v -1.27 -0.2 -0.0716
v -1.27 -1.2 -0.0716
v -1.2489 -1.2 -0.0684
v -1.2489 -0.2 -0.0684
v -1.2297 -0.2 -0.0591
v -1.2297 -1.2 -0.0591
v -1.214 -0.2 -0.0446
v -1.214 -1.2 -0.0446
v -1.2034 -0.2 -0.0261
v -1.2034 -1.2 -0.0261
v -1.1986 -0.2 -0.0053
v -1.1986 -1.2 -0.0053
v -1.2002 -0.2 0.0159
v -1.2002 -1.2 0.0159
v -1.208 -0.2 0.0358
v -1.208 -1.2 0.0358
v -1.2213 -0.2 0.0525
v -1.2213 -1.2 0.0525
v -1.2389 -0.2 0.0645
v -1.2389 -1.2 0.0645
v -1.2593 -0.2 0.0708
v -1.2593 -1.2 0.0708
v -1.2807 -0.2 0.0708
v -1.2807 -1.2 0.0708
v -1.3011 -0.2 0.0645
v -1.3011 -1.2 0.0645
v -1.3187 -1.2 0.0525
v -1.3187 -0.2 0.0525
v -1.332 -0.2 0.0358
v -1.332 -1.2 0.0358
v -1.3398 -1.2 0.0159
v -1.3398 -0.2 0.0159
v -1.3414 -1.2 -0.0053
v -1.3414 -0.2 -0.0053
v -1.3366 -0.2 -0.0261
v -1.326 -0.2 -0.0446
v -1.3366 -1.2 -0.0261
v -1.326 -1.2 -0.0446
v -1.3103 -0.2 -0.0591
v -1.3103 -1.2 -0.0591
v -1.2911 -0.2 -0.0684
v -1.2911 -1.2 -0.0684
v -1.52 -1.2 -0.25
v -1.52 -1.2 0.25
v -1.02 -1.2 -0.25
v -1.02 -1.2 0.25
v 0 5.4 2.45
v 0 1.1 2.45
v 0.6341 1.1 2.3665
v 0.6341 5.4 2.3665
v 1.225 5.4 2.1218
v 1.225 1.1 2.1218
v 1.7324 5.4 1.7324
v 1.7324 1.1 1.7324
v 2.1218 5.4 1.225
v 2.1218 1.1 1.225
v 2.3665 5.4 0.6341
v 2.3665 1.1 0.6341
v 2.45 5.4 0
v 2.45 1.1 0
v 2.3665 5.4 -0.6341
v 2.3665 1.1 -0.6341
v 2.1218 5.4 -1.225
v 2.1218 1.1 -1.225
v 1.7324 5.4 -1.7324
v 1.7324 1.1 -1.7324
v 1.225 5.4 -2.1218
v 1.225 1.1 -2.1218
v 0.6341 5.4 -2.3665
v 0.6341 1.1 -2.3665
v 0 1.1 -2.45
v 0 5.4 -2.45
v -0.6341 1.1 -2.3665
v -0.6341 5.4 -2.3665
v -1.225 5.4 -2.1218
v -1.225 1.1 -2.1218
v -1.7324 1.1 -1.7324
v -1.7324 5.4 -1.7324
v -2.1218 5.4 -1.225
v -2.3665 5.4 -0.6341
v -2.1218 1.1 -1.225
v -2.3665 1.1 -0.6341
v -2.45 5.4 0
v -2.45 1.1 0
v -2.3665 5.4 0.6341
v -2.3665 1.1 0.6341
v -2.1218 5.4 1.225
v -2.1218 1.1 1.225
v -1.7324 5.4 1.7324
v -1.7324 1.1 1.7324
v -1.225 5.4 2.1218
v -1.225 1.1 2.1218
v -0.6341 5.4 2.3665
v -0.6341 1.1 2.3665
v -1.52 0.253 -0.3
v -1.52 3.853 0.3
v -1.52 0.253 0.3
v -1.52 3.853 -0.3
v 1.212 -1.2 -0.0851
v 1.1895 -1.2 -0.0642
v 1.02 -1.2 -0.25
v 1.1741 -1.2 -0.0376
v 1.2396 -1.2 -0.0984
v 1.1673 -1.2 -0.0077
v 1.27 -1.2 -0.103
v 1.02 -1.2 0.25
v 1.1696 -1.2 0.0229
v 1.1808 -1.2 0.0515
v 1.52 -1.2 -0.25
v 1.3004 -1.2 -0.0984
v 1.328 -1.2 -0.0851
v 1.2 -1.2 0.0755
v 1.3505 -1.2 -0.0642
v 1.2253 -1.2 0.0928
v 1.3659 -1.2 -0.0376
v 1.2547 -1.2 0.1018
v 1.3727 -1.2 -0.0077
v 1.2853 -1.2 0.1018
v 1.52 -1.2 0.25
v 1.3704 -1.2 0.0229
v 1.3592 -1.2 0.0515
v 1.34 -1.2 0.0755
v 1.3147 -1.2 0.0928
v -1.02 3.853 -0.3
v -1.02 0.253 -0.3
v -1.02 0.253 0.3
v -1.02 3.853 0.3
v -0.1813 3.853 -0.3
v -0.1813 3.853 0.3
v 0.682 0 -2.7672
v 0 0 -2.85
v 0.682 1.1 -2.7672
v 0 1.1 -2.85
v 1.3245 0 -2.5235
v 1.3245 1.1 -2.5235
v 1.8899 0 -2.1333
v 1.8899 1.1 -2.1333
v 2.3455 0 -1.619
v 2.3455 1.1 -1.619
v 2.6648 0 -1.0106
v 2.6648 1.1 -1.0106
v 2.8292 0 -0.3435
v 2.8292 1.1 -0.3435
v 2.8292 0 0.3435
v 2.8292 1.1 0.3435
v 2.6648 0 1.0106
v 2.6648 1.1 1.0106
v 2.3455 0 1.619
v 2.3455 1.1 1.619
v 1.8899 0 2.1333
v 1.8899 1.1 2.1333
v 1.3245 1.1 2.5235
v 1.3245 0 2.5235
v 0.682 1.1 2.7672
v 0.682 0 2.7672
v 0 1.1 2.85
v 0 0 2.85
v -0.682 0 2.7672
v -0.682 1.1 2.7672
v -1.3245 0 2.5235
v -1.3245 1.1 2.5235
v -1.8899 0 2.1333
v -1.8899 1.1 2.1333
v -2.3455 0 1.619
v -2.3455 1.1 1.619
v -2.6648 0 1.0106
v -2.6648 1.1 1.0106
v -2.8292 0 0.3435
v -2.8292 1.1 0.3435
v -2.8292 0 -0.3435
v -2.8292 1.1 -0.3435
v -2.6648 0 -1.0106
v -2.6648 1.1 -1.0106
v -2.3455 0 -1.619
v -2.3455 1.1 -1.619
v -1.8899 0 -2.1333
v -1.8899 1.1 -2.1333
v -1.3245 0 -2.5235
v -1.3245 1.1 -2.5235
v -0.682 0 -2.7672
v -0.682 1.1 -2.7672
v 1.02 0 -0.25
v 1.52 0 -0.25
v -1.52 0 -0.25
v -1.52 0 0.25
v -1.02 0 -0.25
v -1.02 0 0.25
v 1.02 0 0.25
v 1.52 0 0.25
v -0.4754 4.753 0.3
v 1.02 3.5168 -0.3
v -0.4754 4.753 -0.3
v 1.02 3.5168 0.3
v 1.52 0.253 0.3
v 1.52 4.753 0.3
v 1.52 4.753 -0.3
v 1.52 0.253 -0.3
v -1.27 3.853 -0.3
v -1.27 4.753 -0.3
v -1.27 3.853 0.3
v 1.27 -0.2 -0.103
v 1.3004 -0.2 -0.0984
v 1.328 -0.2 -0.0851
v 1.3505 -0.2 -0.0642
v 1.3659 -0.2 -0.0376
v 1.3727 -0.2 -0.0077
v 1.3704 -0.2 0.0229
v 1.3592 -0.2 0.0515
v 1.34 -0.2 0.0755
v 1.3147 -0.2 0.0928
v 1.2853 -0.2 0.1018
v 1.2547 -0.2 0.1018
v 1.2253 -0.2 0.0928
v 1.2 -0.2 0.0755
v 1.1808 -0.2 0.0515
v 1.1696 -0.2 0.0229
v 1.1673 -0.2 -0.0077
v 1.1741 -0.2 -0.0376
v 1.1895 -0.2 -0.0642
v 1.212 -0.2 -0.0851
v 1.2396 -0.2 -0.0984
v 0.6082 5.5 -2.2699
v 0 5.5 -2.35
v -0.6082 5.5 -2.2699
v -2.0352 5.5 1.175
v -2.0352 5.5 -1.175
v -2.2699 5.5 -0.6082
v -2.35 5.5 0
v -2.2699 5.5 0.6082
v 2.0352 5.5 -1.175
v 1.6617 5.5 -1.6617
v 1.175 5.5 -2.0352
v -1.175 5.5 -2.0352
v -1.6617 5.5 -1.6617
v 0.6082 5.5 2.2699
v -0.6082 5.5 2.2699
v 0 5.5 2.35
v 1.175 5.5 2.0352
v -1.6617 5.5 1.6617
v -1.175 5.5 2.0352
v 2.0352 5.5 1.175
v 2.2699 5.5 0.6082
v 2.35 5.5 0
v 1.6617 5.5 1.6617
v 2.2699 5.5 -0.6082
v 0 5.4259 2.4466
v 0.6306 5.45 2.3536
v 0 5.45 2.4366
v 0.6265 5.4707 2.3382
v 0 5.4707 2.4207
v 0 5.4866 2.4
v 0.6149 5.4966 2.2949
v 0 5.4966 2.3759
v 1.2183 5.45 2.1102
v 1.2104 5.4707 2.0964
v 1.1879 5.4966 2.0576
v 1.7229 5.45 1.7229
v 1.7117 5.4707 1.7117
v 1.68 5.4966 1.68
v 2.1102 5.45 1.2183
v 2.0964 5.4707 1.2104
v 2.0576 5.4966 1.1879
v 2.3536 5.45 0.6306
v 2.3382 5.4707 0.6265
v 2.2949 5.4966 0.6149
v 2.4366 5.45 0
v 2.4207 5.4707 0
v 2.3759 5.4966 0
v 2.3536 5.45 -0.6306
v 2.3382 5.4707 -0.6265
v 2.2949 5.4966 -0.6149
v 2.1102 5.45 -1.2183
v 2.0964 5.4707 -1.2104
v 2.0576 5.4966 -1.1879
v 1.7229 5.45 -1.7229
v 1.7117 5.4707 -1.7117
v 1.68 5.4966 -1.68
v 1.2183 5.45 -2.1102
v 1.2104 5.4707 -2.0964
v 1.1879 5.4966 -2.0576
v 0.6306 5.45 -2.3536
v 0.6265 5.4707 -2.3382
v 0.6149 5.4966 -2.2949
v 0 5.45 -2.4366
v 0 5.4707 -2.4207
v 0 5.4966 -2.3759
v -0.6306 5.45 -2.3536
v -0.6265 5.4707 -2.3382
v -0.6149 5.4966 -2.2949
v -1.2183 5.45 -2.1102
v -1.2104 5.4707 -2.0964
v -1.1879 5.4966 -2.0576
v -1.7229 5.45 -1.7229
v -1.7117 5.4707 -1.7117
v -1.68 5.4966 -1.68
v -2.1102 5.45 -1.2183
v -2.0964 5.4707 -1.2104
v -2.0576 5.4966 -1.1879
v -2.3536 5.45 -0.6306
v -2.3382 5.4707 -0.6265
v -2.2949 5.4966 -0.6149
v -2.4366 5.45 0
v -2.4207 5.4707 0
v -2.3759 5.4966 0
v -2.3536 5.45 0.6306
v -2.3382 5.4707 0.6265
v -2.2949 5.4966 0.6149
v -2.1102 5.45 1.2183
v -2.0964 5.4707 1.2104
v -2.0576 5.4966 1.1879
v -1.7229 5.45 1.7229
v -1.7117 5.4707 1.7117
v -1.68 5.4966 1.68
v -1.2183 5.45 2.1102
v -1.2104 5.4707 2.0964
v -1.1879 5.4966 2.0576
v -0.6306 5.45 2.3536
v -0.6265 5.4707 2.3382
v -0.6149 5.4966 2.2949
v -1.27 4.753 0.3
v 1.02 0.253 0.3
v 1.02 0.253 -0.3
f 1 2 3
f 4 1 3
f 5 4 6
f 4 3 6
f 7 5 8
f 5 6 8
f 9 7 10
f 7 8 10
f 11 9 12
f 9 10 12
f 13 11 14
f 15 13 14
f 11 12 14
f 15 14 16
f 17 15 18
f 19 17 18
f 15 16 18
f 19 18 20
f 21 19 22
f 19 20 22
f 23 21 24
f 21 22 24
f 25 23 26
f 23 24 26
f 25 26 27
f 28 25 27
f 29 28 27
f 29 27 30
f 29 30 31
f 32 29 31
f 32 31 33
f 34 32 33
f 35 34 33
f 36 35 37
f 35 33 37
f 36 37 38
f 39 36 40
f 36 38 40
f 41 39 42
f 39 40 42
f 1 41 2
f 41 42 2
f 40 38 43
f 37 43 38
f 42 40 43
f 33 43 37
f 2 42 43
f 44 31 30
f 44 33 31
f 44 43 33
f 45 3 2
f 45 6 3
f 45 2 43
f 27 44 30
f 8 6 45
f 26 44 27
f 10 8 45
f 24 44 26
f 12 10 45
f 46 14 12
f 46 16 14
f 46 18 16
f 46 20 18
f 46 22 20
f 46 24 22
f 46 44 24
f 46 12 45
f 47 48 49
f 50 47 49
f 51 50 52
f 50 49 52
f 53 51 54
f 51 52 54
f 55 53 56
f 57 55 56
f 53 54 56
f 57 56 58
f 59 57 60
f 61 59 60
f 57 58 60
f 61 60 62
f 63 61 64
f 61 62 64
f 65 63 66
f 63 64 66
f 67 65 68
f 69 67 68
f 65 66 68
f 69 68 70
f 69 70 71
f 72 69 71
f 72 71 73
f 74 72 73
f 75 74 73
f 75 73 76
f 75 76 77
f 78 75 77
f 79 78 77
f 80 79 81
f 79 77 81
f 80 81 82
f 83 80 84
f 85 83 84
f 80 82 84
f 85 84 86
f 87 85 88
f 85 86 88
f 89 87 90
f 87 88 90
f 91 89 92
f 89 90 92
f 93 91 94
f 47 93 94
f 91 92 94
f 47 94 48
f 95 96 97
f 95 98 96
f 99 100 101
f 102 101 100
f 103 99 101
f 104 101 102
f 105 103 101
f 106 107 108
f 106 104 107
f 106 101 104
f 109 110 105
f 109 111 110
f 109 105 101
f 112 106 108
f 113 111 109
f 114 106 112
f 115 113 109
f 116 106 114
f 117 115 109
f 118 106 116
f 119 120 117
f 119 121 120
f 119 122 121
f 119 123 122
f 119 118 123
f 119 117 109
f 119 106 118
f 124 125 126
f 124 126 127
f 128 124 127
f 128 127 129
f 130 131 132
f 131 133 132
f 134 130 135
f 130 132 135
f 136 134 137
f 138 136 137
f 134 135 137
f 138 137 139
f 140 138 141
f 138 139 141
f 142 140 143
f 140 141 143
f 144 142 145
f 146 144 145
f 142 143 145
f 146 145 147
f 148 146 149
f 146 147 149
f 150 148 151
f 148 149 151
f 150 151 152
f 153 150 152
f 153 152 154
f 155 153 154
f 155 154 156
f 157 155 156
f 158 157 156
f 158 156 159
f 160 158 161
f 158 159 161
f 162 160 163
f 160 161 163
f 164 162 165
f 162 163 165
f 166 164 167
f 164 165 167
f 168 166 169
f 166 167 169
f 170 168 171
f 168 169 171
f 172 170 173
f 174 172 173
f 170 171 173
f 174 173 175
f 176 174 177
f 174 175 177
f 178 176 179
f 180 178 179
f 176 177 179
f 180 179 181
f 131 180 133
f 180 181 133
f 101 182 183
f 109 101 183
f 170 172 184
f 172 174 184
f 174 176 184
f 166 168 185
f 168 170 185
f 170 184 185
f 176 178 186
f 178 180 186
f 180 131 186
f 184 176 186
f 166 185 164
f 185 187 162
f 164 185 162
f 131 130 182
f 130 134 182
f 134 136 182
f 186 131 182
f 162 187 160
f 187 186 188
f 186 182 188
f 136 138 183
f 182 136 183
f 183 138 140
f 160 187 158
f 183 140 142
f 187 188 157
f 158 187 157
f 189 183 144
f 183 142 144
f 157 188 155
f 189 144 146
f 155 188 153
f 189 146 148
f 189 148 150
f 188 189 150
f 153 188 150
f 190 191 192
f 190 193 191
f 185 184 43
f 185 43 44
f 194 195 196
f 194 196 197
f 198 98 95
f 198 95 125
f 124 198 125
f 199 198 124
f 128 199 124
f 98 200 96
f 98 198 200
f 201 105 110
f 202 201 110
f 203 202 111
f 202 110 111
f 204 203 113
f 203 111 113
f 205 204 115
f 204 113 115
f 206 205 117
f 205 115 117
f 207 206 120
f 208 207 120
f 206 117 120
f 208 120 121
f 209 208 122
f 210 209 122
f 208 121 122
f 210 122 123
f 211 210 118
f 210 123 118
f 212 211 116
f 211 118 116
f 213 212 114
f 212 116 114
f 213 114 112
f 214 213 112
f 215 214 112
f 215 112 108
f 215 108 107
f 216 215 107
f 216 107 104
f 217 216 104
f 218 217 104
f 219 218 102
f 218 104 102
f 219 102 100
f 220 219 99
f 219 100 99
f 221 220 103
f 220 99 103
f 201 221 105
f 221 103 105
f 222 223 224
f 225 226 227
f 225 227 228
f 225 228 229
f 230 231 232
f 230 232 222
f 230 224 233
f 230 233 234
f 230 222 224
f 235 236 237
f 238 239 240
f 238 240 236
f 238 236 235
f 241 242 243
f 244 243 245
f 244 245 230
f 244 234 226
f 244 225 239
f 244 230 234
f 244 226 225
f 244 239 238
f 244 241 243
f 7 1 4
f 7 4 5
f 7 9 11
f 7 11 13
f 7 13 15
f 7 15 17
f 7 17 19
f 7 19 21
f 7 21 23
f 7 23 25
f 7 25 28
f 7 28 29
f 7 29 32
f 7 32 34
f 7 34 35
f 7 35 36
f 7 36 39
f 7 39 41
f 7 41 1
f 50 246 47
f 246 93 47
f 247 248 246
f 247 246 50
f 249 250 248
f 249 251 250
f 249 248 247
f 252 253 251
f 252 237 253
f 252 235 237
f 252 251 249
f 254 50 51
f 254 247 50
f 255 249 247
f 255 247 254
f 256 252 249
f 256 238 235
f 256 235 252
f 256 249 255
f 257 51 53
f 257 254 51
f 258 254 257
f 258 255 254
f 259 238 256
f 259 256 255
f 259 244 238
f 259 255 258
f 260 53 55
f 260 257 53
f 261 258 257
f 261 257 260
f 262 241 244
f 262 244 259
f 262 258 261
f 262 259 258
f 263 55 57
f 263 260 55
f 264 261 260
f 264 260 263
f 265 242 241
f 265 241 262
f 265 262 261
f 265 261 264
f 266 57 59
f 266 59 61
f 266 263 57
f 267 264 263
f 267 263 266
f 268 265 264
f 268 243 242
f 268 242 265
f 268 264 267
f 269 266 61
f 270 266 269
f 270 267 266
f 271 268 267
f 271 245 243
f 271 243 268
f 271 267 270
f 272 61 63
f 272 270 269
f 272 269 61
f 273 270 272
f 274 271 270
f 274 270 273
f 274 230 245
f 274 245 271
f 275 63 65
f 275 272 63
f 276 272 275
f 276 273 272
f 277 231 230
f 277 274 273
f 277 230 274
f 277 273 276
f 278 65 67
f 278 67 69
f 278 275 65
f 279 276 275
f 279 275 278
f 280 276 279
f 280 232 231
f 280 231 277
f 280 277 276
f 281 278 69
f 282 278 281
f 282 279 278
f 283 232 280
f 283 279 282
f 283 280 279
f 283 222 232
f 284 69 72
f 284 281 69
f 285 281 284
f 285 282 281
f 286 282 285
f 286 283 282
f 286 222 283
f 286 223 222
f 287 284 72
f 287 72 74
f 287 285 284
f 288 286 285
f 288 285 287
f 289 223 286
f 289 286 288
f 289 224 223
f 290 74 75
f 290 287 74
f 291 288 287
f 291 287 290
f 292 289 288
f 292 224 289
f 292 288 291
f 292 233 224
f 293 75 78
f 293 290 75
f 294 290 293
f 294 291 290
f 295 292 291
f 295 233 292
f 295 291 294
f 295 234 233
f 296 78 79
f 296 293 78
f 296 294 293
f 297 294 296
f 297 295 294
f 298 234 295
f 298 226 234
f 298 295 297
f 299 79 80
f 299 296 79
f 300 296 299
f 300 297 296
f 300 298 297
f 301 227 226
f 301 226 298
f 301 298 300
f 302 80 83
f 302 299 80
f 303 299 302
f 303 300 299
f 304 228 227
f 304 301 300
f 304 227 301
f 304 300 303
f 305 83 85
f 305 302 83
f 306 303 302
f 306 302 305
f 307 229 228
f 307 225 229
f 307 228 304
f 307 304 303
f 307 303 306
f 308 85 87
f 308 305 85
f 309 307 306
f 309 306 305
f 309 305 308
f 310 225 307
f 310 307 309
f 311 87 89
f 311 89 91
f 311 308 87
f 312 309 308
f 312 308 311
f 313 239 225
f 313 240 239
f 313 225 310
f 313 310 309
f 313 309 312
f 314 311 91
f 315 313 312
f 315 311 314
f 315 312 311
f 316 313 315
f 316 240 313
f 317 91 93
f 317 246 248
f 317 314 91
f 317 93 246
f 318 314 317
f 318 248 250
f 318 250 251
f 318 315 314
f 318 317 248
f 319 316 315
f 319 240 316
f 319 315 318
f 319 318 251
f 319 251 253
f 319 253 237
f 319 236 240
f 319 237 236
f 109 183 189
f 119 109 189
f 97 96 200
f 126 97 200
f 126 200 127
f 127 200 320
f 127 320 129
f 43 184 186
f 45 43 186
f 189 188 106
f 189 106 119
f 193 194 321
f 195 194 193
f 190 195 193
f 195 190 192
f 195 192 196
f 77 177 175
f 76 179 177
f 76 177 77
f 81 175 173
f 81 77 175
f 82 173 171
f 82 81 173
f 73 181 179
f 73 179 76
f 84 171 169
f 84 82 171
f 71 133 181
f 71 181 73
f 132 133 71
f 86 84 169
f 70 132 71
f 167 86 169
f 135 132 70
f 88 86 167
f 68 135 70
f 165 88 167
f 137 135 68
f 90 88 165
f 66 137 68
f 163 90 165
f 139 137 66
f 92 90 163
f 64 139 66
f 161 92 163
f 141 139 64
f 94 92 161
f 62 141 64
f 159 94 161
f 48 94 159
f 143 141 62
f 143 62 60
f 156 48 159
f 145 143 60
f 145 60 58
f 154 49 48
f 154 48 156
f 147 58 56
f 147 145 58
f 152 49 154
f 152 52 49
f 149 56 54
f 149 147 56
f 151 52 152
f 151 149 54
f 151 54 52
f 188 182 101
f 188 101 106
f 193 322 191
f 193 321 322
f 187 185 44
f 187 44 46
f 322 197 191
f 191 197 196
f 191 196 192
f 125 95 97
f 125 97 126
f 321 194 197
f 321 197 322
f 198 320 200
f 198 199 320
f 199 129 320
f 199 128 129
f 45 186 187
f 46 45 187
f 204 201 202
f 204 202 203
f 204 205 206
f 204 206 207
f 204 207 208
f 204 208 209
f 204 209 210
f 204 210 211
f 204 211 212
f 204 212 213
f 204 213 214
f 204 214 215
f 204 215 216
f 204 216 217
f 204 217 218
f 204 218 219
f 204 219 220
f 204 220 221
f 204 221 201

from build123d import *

# Parameters (mm, degrees)
SKETCH_1_W          = 2.85
SKETCH_1_H          = 1.1
SKETCH_2_W          = 0.5
SKETCH_2_H          = 0.5
EXTRUDE_1_DEPTH     = 1.2
SKETCH_3_W          = 0.5
SKETCH_3_H          = 0.5
EXTRUDE_2_DEPTH     = 1.2
SKETCH_4_R          = 2.45
EXTRUDE_3_DEPTH     = 4.4
FILLET_1_R          = 0.1
CUT_EXTRUDE_1_DEPTH = 0.3
SKETCH_7_R          = 0.071568043
SKETCH_7_R_2        = 0.102987613
CUT_EXTRUDE_2_DEPTH = 1


with BuildPart() as part:
    # 草图1 → 旋转1 (revolve)
    with BuildSketch(Plane.XY, mode=Mode.PRIVATE) as revolve_1_sk:
        with Locations((1.425, 0.55)):
            Rectangle(SKETCH_1_W, SKETCH_1_H)
    revolve(revolve_1_sk.sketch.rotate(Axis((0, 1.1, 0), (0, -1, 0)), 270), axis=Axis((0, 1.1, 0), (0, -1, 0)))

    # 草图2 → 凸台-拉伸1 (add)
    with BuildSketch(Plane.XZ):
        with Locations((1.27, 0)):
            Rectangle(SKETCH_2_W, SKETCH_2_H)
    extrude(amount=EXTRUDE_1_DEPTH)

    # 草图3 → 凸台-拉伸2 (add)
    with BuildSketch(Plane.XZ):
        with Locations((-1.27, 0)):
            Rectangle(SKETCH_3_W, SKETCH_3_H)
    extrude(amount=EXTRUDE_2_DEPTH)

    # 草图4 → 凸台-拉伸3 (add)
    with BuildSketch(Plane(origin=(0, 1.1, 0), x_dir=(-1, 0, 0), z_dir=(0, 1, 0))):
        with Locations(Location((0, 0, 0), (0, 0, 90))):
            Circle(SKETCH_4_R)
    extrude(amount=EXTRUDE_3_DEPTH)

    # 圆角1
    fillet_1_edges = [part.edges().sort_by_distance(p)[0] for p in [
        (0, 5.5, -2.45),
    ]]
    fillet(fillet_1_edges, radius=FILLET_1_R)

    # 草图6 → 切除-拉伸1 (cut, symmetric)
    with BuildSketch(Plane.XY):
        Polygon((-1.02, 3.852964397), (-0.181256176, 3.852964397), (-1.27, 4.752964397), (-1.27, 3.852964397), (-1.52, 3.852964397), (-1.52, 0.252964397), (-1.02, 0.252964397), align=None)
        Polygon((1.52, 0.252964397), (1.02, 0.252964397), (1.02, 3.516785867), (-0.475424156, 4.752964397), (1.52, 4.752964397), align=None)
    extrude(amount=CUT_EXTRUDE_1_DEPTH, both=True, mode=Mode.SUBTRACT)

    # 草图7 → 切除-拉伸2 (cut)
    with BuildSketch(Plane.XZ.offset(1.2)):
        with Locations(Location((-1.27, 0, 0), (0, 0, 270))):
            Circle(SKETCH_7_R)
        with Locations(Location((1.27, 0, 0), (0, 0, 270))):
            Circle(SKETCH_7_R_2)
    extrude(amount=-CUT_EXTRUDE_2_DEPTH, mode=Mode.SUBTRACT)


solid = part.part
